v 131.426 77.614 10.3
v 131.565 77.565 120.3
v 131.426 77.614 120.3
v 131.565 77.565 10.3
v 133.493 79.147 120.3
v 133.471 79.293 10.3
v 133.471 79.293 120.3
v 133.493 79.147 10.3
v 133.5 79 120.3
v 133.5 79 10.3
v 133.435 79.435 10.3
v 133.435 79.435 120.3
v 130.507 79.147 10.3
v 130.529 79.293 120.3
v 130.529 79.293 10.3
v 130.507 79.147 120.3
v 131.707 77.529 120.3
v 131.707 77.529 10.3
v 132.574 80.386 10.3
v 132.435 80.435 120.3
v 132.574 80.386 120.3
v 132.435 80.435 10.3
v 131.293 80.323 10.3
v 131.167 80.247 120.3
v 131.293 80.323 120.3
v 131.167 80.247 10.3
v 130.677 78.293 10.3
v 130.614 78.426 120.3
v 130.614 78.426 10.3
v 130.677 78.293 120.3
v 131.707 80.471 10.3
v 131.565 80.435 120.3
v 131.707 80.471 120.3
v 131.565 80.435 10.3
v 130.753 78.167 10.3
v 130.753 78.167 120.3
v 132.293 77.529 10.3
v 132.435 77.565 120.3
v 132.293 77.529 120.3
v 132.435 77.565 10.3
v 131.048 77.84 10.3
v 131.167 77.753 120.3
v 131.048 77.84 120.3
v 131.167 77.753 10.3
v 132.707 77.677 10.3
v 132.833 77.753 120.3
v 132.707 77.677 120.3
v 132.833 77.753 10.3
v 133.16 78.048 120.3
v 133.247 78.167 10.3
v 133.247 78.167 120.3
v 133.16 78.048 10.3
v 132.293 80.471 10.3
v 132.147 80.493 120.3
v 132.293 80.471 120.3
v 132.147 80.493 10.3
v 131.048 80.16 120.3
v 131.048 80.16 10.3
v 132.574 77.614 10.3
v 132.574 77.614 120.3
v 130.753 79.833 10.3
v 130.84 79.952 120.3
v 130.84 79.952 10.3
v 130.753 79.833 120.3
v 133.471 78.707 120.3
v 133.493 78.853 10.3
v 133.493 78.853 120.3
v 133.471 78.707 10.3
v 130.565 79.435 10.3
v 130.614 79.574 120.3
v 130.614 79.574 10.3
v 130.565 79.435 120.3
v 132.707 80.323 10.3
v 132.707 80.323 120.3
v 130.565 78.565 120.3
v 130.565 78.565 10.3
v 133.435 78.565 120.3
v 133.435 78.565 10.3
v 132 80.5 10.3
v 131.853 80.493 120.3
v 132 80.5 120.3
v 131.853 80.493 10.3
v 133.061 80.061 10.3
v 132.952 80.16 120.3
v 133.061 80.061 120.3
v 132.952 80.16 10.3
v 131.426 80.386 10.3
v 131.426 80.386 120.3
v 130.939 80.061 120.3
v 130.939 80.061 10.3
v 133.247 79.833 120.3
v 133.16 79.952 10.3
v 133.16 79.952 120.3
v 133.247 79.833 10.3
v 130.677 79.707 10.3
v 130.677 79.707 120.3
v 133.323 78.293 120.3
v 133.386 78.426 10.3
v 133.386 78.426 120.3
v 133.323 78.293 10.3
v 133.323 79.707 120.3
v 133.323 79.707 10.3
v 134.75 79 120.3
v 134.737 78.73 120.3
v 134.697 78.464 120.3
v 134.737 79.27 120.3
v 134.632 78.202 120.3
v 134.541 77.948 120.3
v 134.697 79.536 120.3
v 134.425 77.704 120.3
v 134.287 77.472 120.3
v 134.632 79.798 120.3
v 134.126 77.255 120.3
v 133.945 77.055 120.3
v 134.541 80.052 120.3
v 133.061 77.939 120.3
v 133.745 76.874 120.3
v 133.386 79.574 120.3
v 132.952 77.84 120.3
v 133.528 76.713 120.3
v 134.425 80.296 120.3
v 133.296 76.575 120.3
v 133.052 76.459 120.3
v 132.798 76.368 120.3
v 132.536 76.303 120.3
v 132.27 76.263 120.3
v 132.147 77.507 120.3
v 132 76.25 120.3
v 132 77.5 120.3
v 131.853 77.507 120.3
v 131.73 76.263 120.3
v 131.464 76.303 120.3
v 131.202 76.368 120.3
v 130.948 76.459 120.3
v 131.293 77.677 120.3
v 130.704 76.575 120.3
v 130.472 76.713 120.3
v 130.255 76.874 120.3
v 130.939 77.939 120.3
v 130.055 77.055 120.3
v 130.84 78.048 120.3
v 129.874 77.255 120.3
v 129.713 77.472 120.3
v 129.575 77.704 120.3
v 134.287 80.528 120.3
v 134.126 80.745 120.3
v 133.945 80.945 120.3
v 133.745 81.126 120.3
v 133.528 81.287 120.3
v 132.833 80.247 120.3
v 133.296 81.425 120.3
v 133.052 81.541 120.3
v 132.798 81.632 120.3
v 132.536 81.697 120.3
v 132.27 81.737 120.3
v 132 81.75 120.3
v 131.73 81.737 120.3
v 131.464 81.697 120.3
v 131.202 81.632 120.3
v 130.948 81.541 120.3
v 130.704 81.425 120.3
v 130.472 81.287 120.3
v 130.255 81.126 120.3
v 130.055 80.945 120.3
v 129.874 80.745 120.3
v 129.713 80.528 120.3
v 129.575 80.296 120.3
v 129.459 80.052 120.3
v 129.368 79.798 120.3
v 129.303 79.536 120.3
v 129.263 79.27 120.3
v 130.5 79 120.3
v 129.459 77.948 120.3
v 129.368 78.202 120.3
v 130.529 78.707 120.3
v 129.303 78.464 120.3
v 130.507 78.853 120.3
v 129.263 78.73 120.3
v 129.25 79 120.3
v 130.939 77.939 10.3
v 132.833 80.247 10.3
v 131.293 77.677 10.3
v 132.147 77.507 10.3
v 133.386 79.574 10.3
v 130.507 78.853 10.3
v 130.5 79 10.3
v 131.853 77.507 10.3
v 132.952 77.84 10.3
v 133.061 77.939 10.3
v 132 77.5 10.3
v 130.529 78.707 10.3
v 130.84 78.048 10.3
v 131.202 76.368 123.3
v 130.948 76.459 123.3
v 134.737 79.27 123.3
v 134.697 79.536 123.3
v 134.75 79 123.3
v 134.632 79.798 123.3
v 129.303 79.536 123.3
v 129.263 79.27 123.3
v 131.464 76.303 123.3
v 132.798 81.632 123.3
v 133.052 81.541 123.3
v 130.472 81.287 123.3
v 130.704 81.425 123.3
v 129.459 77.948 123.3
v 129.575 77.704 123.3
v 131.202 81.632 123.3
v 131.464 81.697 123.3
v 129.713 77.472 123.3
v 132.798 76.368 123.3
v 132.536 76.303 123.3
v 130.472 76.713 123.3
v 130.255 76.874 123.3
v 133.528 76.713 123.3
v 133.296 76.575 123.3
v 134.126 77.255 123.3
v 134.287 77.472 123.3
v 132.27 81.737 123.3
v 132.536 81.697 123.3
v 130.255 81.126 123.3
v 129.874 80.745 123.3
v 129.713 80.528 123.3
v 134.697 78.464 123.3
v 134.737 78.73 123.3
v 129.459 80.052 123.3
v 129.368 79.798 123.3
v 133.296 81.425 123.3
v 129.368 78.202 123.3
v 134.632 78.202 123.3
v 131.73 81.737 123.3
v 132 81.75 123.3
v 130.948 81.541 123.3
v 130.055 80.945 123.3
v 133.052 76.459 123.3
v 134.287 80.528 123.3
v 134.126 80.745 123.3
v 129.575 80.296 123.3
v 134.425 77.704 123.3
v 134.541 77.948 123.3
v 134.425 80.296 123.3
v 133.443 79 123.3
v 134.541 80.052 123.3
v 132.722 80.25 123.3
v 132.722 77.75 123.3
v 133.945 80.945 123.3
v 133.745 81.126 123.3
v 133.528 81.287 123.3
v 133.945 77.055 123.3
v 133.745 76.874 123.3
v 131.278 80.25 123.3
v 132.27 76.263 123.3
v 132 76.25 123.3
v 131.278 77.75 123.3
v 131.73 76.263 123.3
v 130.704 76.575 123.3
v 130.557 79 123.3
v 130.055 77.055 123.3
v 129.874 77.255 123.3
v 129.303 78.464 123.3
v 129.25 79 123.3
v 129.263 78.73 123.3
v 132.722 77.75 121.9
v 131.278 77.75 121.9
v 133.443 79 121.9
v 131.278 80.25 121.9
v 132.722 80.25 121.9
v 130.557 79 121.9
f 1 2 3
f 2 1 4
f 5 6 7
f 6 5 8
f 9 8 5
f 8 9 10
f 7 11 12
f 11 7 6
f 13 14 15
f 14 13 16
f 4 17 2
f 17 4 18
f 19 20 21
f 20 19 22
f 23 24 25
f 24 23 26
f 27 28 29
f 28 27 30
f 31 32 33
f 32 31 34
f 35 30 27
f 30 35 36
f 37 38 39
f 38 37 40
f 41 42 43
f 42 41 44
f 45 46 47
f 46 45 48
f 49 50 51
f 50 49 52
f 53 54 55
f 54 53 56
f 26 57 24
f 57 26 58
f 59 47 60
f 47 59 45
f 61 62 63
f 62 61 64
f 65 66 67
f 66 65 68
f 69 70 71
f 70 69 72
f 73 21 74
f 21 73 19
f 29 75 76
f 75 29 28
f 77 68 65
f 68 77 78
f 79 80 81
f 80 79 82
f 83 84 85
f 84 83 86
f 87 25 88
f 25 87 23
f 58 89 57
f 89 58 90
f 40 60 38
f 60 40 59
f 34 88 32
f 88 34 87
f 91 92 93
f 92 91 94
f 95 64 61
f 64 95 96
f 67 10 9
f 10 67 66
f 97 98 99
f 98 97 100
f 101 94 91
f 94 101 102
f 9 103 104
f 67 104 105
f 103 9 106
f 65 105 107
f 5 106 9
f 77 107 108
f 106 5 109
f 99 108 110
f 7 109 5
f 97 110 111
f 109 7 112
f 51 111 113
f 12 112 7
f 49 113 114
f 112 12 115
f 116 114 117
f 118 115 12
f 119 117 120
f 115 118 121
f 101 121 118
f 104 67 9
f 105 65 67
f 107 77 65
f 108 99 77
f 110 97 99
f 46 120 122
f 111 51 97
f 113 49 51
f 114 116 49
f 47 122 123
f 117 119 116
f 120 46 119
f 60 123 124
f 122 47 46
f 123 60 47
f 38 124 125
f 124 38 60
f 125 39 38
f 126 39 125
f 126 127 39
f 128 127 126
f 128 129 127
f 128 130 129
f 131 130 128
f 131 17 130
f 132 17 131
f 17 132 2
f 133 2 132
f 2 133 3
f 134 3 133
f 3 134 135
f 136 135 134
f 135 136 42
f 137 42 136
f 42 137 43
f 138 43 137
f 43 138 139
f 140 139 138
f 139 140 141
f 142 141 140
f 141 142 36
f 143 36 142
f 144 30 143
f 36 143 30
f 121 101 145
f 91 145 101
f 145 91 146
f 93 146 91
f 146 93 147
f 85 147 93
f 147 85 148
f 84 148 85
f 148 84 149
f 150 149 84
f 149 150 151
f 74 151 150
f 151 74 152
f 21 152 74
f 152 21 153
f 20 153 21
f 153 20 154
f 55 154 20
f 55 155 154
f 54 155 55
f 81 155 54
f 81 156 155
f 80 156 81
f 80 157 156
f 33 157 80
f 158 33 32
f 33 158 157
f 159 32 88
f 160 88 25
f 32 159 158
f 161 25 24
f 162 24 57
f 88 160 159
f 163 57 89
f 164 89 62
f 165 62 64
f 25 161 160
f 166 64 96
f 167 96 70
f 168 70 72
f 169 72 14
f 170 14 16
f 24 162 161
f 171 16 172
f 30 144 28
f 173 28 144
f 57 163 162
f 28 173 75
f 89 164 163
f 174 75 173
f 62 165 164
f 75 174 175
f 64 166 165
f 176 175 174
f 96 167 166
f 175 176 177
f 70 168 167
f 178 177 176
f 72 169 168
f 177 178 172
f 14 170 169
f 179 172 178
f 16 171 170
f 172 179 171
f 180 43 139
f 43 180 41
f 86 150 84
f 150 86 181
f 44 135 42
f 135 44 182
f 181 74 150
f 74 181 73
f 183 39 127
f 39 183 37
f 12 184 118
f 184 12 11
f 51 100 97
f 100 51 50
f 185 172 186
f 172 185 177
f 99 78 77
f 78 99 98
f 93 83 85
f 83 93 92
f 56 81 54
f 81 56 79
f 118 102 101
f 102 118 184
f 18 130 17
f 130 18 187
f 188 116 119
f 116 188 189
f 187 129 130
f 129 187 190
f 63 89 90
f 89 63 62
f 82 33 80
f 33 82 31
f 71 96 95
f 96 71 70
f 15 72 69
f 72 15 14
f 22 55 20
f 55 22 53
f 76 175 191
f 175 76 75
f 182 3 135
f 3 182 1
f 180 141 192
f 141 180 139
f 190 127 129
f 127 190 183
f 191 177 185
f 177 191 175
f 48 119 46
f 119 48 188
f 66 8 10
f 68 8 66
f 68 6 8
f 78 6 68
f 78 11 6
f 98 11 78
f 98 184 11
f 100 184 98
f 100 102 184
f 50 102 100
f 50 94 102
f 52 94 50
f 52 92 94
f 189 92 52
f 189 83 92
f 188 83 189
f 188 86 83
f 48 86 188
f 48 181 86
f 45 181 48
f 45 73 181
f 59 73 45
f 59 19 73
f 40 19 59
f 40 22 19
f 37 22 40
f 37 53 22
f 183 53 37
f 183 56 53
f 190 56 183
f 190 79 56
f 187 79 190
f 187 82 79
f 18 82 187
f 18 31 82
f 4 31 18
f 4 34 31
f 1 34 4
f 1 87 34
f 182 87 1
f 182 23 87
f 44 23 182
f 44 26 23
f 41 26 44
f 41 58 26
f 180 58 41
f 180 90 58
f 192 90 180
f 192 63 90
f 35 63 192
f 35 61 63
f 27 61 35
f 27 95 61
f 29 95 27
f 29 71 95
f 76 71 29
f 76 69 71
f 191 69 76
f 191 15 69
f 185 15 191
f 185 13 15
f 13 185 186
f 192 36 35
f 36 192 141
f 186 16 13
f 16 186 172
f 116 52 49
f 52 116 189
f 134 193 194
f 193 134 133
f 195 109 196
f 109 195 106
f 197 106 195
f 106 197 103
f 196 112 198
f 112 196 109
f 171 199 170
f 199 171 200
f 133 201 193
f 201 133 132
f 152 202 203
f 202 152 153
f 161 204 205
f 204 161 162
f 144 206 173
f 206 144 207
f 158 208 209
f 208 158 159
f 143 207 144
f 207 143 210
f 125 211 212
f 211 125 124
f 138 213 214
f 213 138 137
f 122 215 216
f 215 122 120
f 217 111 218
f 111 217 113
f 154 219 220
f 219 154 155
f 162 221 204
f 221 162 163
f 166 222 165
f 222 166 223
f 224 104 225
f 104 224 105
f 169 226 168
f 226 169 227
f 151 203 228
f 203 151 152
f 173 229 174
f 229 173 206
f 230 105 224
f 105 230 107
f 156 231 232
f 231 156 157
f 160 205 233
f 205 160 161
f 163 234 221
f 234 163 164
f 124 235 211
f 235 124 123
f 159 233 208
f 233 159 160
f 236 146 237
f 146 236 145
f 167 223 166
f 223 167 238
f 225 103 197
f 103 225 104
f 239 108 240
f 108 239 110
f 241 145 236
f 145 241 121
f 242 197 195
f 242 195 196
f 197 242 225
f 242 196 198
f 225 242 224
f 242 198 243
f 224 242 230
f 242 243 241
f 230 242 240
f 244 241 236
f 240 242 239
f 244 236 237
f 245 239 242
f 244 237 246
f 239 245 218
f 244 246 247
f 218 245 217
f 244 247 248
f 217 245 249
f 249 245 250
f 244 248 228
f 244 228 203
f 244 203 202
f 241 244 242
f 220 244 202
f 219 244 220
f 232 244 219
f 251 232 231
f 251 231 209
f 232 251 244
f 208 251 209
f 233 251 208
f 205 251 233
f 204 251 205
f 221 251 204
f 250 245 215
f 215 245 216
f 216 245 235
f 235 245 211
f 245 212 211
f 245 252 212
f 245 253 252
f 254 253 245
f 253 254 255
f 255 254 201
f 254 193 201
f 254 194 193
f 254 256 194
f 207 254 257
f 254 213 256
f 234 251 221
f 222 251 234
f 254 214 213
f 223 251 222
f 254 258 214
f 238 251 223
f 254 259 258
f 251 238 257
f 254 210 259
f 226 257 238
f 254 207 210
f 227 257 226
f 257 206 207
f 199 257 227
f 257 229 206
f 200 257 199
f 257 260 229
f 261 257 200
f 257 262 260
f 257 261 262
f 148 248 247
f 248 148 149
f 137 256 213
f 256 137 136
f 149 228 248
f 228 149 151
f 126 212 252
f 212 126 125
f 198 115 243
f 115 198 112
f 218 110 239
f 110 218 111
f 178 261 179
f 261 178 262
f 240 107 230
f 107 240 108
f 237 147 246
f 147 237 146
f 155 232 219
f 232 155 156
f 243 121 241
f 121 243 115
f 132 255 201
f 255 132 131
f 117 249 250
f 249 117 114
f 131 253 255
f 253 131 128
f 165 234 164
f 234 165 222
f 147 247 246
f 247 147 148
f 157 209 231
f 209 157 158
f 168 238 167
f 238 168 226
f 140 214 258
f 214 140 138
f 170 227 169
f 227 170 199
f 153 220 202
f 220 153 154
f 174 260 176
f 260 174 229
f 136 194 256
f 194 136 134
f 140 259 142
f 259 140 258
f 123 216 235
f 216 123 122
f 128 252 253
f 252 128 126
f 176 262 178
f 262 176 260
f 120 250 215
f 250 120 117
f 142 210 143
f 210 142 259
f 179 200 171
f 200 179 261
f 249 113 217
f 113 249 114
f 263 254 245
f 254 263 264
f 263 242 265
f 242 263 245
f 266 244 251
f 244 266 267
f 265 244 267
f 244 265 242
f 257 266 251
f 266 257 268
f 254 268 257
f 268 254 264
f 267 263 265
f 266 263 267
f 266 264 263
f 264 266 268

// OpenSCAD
// Generated from the same CSG operations as STEP. Rebuild with spec/build_parent_hand_service.py.
difference(){union(){translate([132,79,10.3]) cylinder(r=1.5,h=110,$fn=64);translate([132,79,120.3]) cylinder(r=2.75,h=3,$fn=64);}translate([132,79,121.9]) cylinder(r=1.4433756729740643,h=1.5,$fn=6);}
